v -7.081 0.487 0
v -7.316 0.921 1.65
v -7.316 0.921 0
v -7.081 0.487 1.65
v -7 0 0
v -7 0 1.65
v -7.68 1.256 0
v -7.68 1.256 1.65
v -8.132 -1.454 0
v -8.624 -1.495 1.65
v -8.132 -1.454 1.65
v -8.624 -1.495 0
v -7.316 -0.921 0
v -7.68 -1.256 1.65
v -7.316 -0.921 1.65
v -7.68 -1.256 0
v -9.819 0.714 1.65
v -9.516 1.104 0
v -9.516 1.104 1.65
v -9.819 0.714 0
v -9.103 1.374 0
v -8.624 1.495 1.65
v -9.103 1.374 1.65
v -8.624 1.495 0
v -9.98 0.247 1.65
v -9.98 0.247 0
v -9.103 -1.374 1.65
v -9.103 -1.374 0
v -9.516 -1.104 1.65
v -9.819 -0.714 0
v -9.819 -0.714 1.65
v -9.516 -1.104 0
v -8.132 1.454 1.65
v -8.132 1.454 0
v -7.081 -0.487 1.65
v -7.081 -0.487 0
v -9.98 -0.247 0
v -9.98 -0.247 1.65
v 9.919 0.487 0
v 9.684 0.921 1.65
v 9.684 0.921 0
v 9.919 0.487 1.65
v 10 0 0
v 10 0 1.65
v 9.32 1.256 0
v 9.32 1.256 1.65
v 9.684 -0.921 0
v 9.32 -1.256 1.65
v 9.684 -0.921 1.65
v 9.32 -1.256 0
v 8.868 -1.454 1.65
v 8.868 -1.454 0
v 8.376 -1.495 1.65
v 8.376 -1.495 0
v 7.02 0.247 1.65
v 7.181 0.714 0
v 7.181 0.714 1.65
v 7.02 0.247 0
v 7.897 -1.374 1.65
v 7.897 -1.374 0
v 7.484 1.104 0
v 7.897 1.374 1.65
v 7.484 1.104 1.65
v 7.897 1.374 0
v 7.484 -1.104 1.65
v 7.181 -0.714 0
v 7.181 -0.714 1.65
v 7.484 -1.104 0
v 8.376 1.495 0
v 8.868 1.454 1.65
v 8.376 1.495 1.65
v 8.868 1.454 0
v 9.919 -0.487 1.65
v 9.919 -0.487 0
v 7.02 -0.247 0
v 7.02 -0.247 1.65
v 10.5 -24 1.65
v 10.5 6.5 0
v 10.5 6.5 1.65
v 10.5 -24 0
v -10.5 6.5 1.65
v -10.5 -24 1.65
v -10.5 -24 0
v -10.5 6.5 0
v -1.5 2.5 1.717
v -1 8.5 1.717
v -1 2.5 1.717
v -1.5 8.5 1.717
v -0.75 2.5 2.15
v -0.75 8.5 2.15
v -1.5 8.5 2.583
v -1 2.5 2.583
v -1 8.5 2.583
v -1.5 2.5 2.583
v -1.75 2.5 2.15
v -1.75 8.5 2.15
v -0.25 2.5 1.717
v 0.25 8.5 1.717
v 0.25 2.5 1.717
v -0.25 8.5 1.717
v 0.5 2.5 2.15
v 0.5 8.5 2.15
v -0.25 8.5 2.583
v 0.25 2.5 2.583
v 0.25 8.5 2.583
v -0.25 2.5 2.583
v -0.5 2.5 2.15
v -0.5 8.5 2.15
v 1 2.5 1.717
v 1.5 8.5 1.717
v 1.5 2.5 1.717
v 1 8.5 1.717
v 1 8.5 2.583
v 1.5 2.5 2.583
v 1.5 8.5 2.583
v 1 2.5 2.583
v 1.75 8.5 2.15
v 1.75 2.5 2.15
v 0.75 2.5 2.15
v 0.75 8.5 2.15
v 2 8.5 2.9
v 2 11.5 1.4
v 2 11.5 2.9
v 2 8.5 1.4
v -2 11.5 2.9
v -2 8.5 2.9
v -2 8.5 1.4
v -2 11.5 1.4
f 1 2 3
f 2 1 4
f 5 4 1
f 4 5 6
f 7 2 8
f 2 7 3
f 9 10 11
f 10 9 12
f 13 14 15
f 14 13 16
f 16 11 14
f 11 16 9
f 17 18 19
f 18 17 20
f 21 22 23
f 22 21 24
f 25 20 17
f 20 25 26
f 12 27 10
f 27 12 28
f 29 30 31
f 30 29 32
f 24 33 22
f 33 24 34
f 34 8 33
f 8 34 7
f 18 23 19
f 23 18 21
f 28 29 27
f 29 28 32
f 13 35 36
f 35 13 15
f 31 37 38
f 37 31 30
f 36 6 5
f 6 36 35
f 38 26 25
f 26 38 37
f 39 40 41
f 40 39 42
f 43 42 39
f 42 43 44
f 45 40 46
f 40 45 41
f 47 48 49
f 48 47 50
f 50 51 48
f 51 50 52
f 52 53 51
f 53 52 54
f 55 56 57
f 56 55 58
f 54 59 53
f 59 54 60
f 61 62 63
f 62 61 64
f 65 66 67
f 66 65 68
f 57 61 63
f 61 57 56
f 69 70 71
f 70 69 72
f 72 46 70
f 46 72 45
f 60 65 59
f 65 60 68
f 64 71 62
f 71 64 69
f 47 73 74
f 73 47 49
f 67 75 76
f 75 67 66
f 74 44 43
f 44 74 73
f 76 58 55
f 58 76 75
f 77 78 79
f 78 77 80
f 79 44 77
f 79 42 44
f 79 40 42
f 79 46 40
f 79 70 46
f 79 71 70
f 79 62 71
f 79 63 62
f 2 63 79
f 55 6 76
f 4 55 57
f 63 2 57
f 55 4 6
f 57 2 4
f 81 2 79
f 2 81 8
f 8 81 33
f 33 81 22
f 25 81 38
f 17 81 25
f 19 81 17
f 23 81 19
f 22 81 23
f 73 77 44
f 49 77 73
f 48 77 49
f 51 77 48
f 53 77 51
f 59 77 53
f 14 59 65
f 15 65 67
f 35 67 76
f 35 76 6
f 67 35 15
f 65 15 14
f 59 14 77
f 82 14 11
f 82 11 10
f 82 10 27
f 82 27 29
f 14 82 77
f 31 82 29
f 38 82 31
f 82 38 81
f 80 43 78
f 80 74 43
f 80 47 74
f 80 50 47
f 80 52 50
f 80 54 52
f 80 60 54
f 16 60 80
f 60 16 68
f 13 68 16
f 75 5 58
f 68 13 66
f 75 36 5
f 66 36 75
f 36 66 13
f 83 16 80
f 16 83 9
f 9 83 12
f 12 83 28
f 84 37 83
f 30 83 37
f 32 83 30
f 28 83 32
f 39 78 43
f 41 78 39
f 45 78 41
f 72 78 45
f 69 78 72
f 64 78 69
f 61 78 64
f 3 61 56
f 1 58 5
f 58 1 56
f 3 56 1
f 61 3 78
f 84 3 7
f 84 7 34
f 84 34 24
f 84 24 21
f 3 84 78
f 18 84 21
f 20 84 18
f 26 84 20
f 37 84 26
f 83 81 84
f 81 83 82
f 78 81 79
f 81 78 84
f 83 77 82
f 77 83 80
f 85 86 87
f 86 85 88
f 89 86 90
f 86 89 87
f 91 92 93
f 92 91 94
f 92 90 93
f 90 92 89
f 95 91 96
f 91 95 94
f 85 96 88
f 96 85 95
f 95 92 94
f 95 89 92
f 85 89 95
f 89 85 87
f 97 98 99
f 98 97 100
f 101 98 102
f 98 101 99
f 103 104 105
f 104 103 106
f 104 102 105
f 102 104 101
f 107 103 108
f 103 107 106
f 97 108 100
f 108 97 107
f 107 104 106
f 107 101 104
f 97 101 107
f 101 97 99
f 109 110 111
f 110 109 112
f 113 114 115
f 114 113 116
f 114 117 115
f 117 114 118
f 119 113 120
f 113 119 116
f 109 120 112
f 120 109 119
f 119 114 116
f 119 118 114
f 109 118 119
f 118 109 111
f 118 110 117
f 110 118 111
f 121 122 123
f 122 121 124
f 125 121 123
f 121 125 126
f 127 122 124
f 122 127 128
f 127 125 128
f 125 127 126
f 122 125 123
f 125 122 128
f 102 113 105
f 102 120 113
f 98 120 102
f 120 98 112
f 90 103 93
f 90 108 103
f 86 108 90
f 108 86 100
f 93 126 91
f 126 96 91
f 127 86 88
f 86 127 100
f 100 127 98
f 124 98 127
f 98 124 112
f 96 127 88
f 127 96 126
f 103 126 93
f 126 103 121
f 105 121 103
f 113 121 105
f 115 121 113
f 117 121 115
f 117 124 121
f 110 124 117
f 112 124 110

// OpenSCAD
// file: ../configuration.scad
$fa = 2;
$fs = 0.5;

motor_end_height=44;
idler_end_height=28;
carriage_height=13.8;
platform_thickness=10;
platform_fix_dia=28;
platform_dia=38;

bearing_diameter=16;
bearing_dia_clearence=0.5;
bearing_free_dia_clearence=0.8;

hotend_diameter=16.4;
hotend_groove_dia=12;

// Frames

// Places mounting holes for the controller
// 33 = RAMPS 1.3 (Power outputs: Extruder, Bed, Fan)
// 34 = RAMPS 1.3 (Power outputs: Extruder0, Extruder1, Bed)
// 35 = RAMPS 1.3 (Power outputs: Extruder, Fan, Fan)
// 70 = Megatronics
// 701 = Megatronics 2.0

motherboard=35;

frame_thickness=8;

// Distance from motor axle to idler axle
// Calculated regarding length of the HTD3M closed belt 
belt_tooth=354;
spacing = round(((belt_tooth*3) - 3.14159 * 24.83) / 2);

rod_length=spacing+55;
rod_diameter=8;
//platform_hinge_offset=25;
//carriage_hinge_offset=17;

printbed_diameter=170;	//printable aera
printbed_thickness=4;		// used for rendering and approximating build volume


//corner_radius=12;
//frame_radius=(tower_radius-rod_diameter/2-corner_radius)/cos(30);

ball_link_distance=40;//55;
ball_offset=6.5;
ball_distance=ball_link_distance-2*ball_offset;
ball_angle=25;

// Delta Settings

delta_smooth_rod_offset=139.5;//140 - 152 floor(printbed_diameter/(2*sin(ball_angle))-printbed_diameter/2+delta_effector_offset+delta_carriage_offset)
delta_effector_offset=18;
delta_carriage_offset=18;
delta_diagonal_rod=ceil(max(printbed_diameter/2+delta_smooth_rod_offset-delta_effector_offset-delta_carriage_offset,printbed_diameter/(2*sin(ball_angle))));
//|-> 202
delta_radius=(delta_smooth_rod_offset-delta_effector_offset-delta_carriage_offset);

diagonal_rod_length=delta_diagonal_rod-2*8;//165
diagonal_rod_diameter=3;
diagonal_rod_length_lost=(printbed_diameter/(2*sin(ball_angle)))-(printbed_diameter/2+delta_smooth_rod_offset-delta_effector_offset-delta_carriage_offset);

diagonal_rod_angle=acos(delta_radius/delta_diagonal_rod);

echo_result=true;

carriage_altitude=sqrt(pow(delta_diagonal_rod,2)-pow(delta_radius,2));



if(echo_result) {
	echo("printbed_diameter",printbed_diameter);
	echo("delta_diagonal_rod",delta_diagonal_rod);
	echo("diagonal_rod_length",diagonal_rod_length);
	echo("delta_effector_offset",delta_effector_offset);
	echo("delta_carriage_offset",delta_carriage_offset);
	echo("delta_radius",delta_radius);
	echo("diagonal_rod_angle",diagonal_rod_angle);
	echo("carriage_altitude",carriage_altitude);
	echo("diagonal_rod_length_lost",diagonal_rod_length_lost);
	echo("delta_smooth_rod_offset_optimum",printbed_diameter/(2*sin(ball_angle))-printbed_diameter/2+delta_effector_offset+delta_carriage_offset);
	echo("rod_length",rod_length);
}
// main file
include <../configuration.scad>;

module endstop() {
	color("white") difference() {
		translate([0,-30.5/2+6.5,1.65/2]) cube([21,30.5,1.65],true);
		for(a=[-1,1]) translate([a*17/2,0,0]) cylinder(h=5, r=3/2, center=true);
	}
	translate([0,3.5+6.5,1.65+0.5]) union() {
		color("black") cube([4,3,1.5],true);
		color("grey") for(a=[-2.5/2,0,2.5/2]) translate([a,0,0]) rotate([90,0,0]) cylinder(h=7.5,r=0.5,center=false, $fn=6);
	}
}

endstop();
